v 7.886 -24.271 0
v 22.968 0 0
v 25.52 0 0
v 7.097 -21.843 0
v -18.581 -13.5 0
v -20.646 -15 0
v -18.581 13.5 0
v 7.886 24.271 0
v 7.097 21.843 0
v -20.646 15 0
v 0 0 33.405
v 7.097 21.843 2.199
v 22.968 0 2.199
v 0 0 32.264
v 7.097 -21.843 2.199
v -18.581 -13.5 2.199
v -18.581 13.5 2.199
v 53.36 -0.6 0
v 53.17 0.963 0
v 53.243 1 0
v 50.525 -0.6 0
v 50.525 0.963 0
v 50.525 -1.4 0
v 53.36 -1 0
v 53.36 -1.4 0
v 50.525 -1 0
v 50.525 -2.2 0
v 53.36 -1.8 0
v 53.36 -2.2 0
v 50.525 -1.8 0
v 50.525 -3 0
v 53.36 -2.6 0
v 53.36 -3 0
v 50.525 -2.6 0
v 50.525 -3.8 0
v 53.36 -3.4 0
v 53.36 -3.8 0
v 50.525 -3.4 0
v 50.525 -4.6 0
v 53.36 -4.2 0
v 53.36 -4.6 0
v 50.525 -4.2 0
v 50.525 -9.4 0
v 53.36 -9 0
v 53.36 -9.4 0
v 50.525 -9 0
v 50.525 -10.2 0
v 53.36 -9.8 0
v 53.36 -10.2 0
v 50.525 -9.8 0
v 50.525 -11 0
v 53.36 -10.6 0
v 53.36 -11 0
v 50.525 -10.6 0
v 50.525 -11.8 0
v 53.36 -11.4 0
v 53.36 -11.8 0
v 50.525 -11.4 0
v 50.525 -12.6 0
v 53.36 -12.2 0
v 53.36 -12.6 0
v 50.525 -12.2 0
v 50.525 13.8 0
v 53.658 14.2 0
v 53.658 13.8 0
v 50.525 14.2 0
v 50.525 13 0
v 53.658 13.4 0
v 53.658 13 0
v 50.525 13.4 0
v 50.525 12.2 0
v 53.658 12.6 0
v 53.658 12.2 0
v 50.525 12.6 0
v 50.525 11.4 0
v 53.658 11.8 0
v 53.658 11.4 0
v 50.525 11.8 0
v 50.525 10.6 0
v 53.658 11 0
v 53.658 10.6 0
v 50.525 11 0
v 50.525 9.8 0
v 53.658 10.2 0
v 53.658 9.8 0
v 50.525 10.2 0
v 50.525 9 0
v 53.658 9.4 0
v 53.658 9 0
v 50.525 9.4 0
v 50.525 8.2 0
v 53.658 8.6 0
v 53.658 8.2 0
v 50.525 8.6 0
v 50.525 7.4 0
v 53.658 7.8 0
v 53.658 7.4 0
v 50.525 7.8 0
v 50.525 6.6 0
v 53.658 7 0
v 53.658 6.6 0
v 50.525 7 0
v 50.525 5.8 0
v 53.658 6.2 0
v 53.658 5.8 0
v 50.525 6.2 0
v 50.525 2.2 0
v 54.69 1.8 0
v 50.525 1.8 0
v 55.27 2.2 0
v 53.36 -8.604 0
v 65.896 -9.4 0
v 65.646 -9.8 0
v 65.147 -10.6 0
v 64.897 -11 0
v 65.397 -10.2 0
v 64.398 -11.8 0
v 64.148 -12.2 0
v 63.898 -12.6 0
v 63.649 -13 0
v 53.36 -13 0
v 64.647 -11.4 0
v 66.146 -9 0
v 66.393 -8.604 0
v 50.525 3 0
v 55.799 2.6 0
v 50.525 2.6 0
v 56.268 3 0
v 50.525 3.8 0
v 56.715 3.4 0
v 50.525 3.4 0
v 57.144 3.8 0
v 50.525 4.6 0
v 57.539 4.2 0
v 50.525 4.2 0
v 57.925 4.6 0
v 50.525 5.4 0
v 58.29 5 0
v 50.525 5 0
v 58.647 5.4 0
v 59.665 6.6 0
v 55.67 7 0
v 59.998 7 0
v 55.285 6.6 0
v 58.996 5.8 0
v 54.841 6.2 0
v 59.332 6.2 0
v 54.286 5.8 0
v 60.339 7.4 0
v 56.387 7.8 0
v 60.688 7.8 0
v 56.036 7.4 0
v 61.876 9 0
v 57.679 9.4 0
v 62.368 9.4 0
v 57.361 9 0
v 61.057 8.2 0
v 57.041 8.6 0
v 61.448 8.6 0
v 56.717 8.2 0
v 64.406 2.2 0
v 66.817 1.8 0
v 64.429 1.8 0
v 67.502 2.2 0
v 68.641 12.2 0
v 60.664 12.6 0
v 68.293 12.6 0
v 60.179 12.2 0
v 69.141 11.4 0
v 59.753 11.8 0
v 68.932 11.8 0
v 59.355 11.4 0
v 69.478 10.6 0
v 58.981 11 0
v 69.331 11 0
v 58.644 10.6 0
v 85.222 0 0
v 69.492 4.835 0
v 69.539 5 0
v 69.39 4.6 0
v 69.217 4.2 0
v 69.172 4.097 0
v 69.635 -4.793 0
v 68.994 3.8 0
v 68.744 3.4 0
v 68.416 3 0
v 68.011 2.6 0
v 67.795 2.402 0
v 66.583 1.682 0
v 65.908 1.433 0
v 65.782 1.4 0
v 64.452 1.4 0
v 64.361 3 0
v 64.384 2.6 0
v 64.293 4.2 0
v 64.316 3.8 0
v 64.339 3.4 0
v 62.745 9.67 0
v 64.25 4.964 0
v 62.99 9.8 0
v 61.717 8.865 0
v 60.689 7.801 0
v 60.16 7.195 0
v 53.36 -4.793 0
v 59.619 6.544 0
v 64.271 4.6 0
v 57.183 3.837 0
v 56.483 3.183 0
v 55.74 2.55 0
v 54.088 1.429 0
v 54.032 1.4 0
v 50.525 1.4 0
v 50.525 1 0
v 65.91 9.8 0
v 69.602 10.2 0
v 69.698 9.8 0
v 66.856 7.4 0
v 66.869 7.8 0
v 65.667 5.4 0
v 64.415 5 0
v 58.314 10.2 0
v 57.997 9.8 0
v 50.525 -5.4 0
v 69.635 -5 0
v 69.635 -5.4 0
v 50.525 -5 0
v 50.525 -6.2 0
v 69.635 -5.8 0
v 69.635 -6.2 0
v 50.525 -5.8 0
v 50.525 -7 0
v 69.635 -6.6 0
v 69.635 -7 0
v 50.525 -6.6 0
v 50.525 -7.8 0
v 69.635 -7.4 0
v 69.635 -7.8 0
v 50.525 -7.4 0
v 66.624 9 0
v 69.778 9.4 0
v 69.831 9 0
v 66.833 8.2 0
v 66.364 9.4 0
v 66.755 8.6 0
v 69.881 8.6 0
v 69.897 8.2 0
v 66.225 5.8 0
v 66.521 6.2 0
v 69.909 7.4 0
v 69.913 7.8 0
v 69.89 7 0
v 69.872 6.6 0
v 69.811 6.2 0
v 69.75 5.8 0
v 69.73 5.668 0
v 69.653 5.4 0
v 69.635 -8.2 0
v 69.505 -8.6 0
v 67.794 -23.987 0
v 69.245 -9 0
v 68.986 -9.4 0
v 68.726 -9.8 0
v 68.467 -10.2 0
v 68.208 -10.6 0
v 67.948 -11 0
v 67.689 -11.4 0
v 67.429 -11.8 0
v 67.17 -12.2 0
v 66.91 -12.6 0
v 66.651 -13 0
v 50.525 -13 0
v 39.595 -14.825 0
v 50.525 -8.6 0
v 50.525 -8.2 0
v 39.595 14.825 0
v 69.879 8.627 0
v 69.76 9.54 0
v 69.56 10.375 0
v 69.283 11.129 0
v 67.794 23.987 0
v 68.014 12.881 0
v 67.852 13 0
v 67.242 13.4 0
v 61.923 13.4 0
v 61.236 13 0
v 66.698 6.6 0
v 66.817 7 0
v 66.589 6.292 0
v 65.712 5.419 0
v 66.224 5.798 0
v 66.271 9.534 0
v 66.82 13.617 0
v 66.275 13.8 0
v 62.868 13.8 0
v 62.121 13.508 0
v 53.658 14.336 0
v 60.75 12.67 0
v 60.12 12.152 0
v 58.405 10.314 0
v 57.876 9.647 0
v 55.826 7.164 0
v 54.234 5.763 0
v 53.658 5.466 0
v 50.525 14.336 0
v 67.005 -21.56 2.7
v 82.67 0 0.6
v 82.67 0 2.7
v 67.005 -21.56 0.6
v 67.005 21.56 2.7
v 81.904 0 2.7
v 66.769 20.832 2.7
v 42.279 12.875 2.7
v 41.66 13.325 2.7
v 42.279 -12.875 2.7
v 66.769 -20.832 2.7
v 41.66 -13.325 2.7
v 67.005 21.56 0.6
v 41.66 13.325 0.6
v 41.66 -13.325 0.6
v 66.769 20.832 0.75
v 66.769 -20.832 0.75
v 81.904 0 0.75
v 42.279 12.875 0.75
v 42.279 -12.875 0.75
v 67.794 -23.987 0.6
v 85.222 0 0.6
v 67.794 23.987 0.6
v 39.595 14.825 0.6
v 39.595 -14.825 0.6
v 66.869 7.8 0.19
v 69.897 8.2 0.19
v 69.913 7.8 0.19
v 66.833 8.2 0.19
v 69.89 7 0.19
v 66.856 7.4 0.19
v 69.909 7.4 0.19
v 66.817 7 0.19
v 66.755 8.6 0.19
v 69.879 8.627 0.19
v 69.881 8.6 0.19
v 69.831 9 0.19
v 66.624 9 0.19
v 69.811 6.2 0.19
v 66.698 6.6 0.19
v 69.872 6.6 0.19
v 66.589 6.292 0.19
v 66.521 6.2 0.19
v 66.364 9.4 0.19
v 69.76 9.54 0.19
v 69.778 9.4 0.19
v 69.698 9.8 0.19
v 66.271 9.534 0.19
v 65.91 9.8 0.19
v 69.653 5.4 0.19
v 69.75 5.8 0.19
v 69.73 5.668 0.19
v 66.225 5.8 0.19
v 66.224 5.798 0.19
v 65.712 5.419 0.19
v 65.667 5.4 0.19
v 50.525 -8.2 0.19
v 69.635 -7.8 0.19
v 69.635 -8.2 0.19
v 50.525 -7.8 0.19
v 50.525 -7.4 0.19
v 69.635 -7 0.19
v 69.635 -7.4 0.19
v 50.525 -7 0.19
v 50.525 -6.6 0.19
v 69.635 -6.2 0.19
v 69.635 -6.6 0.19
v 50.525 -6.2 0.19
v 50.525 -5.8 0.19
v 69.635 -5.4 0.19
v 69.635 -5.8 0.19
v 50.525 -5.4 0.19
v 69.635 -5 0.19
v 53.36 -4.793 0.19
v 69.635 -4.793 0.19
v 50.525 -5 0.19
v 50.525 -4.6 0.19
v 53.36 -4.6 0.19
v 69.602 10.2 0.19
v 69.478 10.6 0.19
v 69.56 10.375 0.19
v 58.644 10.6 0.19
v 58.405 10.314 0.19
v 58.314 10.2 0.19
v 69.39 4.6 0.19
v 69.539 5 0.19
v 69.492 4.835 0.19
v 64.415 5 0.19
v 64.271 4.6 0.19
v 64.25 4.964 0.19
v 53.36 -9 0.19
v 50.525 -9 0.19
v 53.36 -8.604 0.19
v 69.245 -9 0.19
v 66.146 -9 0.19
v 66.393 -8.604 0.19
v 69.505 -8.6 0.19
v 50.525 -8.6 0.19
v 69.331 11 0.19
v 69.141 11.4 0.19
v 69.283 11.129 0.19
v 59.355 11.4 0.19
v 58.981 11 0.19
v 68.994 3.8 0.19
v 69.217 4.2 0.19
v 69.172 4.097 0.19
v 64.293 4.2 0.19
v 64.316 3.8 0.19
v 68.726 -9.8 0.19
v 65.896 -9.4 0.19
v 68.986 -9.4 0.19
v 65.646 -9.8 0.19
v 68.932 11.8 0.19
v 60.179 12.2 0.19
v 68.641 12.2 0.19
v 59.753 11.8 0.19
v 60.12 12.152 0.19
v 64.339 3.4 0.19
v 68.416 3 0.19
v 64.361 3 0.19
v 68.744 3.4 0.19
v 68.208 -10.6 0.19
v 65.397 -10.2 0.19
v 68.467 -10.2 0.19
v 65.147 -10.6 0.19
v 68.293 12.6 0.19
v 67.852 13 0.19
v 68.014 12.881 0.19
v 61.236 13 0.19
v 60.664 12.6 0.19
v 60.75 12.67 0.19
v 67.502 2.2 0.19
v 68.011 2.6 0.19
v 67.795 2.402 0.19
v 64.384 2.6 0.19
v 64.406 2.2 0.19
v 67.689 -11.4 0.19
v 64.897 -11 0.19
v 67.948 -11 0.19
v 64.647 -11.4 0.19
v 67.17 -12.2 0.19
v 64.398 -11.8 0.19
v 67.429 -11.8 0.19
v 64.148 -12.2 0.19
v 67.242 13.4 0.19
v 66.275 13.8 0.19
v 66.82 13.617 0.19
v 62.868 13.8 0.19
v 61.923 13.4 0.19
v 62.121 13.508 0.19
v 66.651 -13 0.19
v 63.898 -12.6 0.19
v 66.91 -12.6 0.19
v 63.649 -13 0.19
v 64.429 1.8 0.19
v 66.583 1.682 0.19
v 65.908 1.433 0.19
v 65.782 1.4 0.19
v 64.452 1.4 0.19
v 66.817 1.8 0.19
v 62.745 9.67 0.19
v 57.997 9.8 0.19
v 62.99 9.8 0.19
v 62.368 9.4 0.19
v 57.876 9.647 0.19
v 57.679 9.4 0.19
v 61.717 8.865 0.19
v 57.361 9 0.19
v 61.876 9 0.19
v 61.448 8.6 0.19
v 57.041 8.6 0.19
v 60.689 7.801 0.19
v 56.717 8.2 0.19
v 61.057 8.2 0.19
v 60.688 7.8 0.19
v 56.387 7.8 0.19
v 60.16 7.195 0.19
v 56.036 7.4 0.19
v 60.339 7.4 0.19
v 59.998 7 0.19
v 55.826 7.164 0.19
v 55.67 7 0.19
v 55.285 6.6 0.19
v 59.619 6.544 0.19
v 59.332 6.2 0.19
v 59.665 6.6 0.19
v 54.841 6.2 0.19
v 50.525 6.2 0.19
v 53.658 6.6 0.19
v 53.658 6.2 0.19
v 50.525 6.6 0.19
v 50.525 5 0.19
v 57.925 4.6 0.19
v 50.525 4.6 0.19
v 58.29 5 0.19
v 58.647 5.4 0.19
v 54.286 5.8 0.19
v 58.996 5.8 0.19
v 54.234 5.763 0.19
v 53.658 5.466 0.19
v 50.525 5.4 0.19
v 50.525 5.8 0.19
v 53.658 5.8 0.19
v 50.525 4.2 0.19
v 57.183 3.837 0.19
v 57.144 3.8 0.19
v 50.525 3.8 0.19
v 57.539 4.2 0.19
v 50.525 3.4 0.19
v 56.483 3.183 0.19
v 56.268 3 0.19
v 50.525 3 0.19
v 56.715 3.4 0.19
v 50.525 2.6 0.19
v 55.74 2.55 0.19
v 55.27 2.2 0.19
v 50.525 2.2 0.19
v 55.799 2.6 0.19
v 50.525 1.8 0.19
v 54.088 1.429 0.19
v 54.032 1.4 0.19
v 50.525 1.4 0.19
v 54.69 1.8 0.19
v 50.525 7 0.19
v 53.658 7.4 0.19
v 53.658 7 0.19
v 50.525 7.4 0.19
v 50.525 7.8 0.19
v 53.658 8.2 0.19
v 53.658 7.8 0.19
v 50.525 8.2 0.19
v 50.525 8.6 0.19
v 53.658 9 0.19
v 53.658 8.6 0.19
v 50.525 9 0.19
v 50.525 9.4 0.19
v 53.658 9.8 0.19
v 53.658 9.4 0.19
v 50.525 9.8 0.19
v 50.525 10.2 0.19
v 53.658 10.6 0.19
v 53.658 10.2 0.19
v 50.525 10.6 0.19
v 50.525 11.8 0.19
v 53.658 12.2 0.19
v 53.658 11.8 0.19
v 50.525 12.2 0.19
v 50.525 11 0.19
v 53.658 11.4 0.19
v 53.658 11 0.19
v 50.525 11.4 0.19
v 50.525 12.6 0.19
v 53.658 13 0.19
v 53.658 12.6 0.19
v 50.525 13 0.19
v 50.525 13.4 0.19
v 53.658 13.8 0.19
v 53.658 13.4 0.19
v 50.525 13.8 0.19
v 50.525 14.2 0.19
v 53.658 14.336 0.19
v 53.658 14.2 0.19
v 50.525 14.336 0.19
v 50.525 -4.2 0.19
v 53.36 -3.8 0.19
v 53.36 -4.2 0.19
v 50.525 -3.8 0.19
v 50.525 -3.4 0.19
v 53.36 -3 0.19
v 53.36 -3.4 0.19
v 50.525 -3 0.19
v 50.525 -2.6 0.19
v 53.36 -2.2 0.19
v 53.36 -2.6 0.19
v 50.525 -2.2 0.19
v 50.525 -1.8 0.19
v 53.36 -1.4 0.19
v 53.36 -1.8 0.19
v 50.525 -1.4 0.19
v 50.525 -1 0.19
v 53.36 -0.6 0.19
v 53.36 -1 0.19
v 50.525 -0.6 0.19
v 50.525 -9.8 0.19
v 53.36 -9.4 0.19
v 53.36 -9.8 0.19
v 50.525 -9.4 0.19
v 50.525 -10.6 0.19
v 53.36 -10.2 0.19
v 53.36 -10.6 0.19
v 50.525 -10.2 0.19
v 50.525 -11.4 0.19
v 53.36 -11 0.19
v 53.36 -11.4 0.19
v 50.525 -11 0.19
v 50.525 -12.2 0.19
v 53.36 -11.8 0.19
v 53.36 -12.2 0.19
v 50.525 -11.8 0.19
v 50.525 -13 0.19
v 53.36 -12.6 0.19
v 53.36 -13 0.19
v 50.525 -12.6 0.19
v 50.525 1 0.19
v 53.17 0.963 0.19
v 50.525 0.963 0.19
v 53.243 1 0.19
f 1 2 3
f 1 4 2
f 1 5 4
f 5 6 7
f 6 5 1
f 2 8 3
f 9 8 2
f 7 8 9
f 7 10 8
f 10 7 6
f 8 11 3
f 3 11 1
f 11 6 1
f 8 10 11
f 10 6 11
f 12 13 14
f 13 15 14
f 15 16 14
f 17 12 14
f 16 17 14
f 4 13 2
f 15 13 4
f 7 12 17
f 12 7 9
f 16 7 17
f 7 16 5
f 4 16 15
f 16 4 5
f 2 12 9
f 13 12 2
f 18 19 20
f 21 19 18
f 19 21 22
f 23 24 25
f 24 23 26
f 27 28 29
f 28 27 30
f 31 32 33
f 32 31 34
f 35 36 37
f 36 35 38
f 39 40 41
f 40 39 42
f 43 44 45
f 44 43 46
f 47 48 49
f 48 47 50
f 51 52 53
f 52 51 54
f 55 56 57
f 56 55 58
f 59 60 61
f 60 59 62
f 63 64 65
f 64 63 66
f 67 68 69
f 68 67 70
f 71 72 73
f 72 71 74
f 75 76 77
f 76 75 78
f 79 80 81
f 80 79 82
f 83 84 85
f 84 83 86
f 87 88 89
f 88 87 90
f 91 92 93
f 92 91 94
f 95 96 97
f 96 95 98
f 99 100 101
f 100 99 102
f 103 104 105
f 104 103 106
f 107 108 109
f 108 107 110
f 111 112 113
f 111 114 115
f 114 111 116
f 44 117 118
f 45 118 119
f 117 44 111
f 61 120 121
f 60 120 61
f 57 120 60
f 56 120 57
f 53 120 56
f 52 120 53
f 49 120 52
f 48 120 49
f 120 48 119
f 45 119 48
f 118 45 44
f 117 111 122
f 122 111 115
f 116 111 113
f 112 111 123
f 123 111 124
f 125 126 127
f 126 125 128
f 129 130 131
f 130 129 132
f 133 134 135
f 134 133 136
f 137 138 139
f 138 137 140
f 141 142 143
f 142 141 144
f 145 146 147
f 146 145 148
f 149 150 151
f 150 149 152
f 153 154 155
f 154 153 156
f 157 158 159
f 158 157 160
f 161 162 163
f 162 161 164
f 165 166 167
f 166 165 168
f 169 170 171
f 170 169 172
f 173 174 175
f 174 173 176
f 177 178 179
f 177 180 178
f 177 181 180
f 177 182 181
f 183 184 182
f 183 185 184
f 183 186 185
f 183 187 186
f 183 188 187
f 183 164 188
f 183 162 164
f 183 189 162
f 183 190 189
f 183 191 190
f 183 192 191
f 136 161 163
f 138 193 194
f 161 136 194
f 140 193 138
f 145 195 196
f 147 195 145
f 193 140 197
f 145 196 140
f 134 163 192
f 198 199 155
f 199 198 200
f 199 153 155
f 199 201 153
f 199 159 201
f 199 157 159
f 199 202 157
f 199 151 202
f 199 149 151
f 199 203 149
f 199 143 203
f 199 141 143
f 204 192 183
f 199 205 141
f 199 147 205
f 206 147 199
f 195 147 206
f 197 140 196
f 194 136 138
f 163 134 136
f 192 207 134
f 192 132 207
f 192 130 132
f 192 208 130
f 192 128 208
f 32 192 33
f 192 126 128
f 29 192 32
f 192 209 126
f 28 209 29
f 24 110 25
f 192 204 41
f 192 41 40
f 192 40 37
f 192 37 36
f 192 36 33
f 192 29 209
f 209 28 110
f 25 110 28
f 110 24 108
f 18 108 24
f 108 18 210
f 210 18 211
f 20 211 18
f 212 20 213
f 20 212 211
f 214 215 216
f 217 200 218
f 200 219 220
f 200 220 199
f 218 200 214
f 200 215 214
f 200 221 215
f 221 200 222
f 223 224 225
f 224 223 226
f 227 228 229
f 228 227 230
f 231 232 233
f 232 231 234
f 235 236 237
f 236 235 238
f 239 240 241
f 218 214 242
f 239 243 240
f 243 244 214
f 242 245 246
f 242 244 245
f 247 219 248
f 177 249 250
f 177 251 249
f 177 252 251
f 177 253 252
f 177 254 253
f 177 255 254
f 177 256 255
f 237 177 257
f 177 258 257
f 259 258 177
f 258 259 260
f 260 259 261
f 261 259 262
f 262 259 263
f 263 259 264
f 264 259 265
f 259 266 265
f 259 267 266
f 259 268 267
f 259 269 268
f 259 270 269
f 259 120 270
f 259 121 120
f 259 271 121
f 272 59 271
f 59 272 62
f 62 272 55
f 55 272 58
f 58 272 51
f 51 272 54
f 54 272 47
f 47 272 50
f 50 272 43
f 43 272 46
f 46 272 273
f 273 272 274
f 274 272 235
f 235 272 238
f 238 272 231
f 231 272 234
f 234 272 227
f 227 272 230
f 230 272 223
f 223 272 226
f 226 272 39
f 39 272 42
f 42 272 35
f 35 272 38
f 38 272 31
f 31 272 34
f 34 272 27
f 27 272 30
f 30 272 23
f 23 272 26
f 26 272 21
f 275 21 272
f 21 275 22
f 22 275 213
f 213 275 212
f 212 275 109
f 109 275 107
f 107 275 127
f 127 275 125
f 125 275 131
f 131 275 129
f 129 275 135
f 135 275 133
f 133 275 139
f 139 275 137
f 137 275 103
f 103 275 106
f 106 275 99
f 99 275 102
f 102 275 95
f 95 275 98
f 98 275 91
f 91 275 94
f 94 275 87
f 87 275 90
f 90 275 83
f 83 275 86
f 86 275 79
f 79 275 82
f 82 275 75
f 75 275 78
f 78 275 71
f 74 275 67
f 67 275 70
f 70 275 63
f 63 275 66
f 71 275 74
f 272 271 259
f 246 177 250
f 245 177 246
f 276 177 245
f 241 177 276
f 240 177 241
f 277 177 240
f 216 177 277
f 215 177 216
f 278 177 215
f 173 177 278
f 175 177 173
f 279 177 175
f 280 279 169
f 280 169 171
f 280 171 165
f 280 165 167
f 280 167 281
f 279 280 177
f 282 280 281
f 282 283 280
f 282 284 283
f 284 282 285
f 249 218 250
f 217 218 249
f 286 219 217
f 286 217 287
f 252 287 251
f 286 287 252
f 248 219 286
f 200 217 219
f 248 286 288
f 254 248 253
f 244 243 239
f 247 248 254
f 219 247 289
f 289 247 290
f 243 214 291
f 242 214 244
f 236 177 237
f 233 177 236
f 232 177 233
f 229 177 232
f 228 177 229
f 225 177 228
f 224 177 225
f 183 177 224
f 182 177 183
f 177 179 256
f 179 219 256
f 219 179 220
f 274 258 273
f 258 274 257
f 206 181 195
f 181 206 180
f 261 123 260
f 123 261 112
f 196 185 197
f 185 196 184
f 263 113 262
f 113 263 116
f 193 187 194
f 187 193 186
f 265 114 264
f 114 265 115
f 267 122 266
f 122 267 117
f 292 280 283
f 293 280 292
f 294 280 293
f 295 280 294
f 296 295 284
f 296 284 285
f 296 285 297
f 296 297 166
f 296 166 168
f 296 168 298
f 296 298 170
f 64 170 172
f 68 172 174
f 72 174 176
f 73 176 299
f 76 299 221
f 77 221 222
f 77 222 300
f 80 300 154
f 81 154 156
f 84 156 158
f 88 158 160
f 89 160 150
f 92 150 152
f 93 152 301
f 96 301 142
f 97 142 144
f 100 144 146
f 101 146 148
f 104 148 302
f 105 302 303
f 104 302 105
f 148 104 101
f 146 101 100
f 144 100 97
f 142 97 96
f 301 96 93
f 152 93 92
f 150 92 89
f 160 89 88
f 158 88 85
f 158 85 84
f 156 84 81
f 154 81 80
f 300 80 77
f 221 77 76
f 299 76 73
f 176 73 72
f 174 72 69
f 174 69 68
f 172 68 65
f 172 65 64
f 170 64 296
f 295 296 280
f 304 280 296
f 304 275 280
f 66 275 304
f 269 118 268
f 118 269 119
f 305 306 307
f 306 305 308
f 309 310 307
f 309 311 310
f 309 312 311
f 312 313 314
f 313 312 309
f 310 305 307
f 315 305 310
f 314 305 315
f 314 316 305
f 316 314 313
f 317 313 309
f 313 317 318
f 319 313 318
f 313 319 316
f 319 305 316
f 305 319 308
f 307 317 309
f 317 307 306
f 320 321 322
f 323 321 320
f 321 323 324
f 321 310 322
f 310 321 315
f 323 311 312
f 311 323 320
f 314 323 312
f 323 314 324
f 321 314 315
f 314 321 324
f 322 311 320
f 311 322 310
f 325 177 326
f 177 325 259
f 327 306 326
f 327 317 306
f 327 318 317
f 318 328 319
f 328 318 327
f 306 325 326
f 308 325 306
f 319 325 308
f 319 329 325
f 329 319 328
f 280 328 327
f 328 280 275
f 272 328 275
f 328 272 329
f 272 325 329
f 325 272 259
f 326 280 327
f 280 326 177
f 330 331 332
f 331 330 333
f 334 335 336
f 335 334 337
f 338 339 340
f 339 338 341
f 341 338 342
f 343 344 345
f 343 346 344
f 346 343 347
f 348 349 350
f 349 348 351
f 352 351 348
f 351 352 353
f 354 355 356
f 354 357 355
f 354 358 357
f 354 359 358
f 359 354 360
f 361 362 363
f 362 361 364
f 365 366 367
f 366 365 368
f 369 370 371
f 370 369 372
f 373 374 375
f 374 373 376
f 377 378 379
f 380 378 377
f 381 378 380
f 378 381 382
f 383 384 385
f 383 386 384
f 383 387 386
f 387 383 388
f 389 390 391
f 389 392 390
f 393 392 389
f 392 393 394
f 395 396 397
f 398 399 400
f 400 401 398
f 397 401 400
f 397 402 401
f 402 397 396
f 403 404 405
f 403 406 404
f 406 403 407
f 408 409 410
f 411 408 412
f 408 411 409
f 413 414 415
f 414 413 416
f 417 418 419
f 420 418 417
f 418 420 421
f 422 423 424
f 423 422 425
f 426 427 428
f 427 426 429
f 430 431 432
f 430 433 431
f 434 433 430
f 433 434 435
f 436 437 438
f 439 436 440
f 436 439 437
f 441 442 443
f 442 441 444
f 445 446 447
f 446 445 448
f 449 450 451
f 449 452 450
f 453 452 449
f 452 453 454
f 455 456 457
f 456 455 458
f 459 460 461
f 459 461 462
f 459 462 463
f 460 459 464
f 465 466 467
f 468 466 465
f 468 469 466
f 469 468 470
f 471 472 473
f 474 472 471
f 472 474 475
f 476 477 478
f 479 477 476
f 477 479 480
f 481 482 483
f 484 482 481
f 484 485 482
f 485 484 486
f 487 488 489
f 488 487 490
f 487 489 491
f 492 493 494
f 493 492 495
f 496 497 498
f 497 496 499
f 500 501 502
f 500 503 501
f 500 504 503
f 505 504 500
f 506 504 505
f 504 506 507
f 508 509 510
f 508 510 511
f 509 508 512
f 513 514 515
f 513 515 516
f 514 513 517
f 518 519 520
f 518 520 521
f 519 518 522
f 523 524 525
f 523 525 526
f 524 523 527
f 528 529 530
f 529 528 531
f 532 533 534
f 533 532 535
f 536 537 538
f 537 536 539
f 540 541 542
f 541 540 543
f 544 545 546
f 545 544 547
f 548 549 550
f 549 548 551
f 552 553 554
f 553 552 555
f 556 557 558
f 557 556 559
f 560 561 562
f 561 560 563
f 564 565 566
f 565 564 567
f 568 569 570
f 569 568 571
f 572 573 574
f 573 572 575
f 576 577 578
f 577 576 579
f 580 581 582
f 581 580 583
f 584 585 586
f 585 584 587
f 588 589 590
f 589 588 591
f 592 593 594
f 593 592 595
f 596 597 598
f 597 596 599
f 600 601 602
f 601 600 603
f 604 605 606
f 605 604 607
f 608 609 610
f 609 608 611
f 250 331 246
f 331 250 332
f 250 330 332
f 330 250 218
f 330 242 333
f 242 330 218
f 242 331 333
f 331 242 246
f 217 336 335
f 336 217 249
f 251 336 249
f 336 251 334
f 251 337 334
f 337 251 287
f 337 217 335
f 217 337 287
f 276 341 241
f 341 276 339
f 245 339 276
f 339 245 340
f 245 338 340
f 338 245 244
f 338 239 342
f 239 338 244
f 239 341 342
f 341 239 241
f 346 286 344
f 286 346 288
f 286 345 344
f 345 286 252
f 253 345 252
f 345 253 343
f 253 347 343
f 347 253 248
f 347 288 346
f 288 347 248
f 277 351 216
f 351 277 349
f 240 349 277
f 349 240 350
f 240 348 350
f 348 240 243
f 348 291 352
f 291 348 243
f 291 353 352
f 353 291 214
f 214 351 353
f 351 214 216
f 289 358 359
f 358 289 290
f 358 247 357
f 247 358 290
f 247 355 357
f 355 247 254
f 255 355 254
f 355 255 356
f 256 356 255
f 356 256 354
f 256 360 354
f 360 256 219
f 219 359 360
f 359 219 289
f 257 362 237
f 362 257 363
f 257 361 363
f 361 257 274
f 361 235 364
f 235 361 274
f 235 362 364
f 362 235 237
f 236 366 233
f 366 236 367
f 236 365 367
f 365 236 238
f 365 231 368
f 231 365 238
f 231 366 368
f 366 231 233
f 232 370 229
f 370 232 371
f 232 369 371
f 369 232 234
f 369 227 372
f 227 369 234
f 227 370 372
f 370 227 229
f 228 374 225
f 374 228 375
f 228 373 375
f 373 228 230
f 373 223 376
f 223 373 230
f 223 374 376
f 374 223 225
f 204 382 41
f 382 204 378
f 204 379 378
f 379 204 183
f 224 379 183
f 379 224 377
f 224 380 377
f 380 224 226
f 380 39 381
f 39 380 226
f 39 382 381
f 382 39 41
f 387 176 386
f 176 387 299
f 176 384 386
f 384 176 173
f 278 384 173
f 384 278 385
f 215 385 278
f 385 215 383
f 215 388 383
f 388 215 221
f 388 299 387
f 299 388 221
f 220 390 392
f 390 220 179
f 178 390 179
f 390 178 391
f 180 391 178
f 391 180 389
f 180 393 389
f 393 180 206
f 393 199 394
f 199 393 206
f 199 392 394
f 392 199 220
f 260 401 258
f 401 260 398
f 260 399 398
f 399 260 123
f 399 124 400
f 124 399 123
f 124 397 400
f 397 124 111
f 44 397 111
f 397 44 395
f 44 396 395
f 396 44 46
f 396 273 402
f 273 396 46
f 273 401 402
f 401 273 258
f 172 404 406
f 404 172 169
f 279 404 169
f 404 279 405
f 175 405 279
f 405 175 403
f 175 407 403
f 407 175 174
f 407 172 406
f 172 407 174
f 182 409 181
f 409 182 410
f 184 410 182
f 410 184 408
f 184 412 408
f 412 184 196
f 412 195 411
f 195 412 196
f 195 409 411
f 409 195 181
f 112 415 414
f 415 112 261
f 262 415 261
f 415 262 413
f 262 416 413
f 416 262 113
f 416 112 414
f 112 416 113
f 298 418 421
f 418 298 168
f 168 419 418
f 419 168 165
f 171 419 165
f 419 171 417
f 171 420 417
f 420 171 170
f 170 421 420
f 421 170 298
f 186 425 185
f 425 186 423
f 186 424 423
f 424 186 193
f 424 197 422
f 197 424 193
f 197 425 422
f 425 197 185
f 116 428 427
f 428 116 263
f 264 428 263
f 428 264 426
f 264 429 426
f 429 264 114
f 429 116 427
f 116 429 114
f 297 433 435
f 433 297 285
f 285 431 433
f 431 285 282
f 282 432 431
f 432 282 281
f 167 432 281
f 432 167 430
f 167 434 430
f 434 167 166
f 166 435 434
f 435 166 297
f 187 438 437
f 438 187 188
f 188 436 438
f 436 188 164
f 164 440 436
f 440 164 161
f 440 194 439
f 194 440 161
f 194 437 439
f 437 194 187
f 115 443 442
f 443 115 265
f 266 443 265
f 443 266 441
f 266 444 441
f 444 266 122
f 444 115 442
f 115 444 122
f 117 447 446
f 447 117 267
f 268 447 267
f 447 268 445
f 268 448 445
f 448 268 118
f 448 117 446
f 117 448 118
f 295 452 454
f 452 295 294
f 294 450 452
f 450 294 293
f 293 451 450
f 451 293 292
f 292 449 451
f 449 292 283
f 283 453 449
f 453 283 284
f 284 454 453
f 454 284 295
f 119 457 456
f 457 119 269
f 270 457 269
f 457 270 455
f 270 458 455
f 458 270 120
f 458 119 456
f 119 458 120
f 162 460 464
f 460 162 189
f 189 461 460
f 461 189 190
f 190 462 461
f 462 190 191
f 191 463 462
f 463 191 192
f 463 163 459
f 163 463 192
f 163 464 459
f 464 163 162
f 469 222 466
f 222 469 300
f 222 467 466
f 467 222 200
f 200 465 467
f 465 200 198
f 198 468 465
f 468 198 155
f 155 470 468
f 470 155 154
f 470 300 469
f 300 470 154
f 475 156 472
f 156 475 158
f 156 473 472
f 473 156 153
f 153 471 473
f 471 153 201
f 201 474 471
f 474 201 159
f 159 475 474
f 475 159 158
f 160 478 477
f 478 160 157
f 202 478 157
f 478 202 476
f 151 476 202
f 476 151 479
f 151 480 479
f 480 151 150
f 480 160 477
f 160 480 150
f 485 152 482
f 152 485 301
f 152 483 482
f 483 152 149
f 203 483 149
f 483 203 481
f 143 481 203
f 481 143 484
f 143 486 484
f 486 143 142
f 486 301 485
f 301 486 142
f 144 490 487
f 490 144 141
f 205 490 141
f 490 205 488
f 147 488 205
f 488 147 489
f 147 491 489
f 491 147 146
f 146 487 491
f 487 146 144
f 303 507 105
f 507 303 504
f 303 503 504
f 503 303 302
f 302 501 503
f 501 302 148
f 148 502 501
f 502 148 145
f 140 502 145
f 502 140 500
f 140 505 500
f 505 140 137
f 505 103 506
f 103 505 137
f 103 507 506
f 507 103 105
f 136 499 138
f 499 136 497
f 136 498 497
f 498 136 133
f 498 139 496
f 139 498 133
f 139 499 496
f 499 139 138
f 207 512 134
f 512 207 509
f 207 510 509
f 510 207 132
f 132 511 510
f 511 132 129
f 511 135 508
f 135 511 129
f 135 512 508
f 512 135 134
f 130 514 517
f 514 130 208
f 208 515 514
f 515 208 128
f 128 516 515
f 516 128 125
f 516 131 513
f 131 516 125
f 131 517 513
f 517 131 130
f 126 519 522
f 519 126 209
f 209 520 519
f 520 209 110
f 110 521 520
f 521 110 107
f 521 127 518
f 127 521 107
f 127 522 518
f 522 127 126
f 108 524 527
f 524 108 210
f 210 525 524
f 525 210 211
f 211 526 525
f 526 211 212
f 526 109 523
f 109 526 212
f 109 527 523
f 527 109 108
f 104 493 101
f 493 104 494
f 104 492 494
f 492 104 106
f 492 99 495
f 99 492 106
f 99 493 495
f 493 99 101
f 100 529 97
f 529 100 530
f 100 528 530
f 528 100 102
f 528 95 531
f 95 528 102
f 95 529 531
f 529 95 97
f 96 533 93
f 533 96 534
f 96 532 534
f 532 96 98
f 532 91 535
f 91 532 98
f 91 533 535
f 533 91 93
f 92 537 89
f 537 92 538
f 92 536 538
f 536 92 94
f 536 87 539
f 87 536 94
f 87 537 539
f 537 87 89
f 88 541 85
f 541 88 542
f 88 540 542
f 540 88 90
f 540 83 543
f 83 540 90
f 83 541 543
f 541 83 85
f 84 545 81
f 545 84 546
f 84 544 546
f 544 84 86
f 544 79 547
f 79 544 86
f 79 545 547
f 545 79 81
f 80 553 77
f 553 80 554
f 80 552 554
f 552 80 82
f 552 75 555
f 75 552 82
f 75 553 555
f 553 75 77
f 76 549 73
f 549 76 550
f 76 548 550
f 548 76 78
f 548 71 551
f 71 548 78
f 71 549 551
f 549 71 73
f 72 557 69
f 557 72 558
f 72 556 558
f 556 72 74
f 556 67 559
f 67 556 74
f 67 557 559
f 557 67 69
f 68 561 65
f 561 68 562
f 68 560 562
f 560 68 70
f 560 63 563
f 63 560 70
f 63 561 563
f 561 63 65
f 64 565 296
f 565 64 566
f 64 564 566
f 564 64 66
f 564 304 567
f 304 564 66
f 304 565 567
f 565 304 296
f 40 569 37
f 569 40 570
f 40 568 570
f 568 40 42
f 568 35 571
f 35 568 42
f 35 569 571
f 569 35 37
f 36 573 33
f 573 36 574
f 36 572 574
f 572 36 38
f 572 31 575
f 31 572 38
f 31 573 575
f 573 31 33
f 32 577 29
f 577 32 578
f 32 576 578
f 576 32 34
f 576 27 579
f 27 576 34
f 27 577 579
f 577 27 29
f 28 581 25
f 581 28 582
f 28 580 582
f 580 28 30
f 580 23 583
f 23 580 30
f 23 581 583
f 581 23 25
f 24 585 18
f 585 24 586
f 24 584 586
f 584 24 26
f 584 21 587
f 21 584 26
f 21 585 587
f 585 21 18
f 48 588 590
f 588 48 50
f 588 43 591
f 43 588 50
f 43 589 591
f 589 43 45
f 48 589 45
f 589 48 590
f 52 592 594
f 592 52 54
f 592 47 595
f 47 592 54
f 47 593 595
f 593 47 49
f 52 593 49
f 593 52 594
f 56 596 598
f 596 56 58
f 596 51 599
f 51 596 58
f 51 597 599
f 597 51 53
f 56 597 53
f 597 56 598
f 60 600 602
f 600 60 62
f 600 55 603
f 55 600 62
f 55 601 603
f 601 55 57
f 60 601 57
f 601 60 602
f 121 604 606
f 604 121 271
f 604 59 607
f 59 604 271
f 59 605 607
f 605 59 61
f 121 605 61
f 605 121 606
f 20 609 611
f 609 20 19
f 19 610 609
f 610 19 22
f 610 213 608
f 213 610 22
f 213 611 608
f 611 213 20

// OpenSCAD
// dodekaeder.scad
//   experiments with pentagons forming a dodecahedron
//
//
// Background:
//   - kann auch als Adventskalender benutzt werden.
//   - printed with a layer step of 0.15 mm
//   - CAD manual: http://www.openscad.org/documentation.html
//   - https://de.wikipedia.org/wiki/Dodekaeder
//   - https://en.wikipedia.org/wiki/Dodecahedron
//   - hosted on:
//     https://www.thingiverse.com/thing:4012530
//     git@github.com:Github6am/am_parts3D.git
//
// Andreas Merz 2019-12-01, v1.2 
// GPLv3 or later, see http://www.gnu.org/licenses

a=30;     // outer edge length
b=27;     // inner edge length
w=0.6;    // wall thickness

// Dodekaederzahlen
ci=1.113516364411607;    // Inkugelradius/a  sqrt((25+11*sqrt(5))/10)/2;
co=1.401258538444073;    // Umkugelradius/a  sqrt(3)*(1+sqrt(5))/4;
h=a*ci;                  // height of a cone           

beta=121.7174744114610;  // deg, Flaechen-Kantenwinkel
alpha=116.5650511770780; // deg, Flaechenwinkel , acos(-1/sqrt(5))


module poly2D(r=30, n=5) {
   circle(r=r, $fn=n);
}

module pentagon2D(l_edge = a) {
  poly2D(r = l_edge/(2*sin(36)), n=5);
}

//-----------------------------------------------
// pyramid shaped parts of a dodecahedron
//-----------------------------------------------

module facet0() {
  d=a/(2*tan(36));   // Abstand Seitenmitte vom Zentrum
  phi1=atan(d/h);    // Winkel zwischen Seitenflaeche und Lot
  dh=w/sin(phi1);    // vertikale Verschiebung, um Wandstaerke zu erreichen
  
  difference() {
    linear_extrude(height=h, scale=0) pentagon2D();
    translate([0, 0, -dh]) 
      linear_extrude(height=h, scale=0) pentagon2D();
  }
}

module facet1() {
  u=ci*(a-b);
  union() {
    facet0();
    difference() {
      linear_extrude(height=u, scale=(h-u)/h) pentagon2D(l_edge=a-w);
      translate([0, 0, -0.1])
        linear_extrude(height=u+0.2, scale=1) pentagon2D(l_edge=b);
    }
  }
}

module facet1t() {
  phi2=2*beta-180;   
  translate([0, 0, h]) rotate([0, phi2, 0]) translate([0, 0, -h]) rotate([0, 0, 36]) facet1(); 
}

module facet6() {
  union() {
    facet1();
    rotate([0, 0, 0*72]) facet1t();
    rotate([0, 0, 1*72]) facet1t();
    rotate([0, 0, 2*72]) facet1t();
    rotate([0, 0, 3*72]) facet1t();
    rotate([0, 0, 4*72]) facet1t();
  }
}

module facet12() {
  union() {
    facet6();
    translate([0, 0, h]) rotate([0, 180, 72]) translate([0, 0, -h]) facet6();
  }
}

//-----------------------------------------------
// numbered caps to close the faces
//-----------------------------------------------

module cap1() {
  c=0.35;
  hrim=0.7*(a-b);
  union() {
    linear_extrude(height=w, scale=1) pentagon2D(l_edge=a-c);
    difference() {    // rim
      linear_extrude(height=w+hrim, scale=1) pentagon2D(l_edge=b-c);
      translate([0, 0, w+0.15])
  	linear_extrude(height=w+hrim, scale=1) pentagon2D(l_edge=b-c-1.5*w);
    }
  }
}

module grid2D(spacing=0.8) {    // a grid pattern for the text
  w=0.5;
  for( i=[-a:spacing:a] ) {
    translate([i,0,-0.01]) square([spacing/2,a],center=true);
  }
}

module capA(txt="12") {
  depth=0.2;
  fontname = "Liberation Sans:Bold";
  fontsize = 20;
  difference() {
    cap1();
    //color("red")
    translate([0,0,-0.01]) mirror([1,0,0]) rotate(90)
      linear_extrude(height = depth)
	difference() {
	  text(txt, size = fontsize, font = fontname, halign = "center", valign = "center", $fn = 16);
	  grid2D();
	}
  }
}

//-----------------------------------------------
// a foot to place the dodecahedron segments in
//-----------------------------------------------

nf=5;	   // nf     number of faces, a high number yields a circular shape.
c2=2;	   // c2     height of foot cone below rim
kk=tan(180-beta);
clr=1.2;     // clearance

//h2=a;      // h2     height of foot cone above rim

module foot0(hole=0, h2=1.2*a) {
  //hole    option for depth of conical borehole
  // h2     height of foot cone above rim
  c=clr;
  // helper sizes
  rr = a/(2*sin(36)); // inner rim radius
  h=kk*rr;            // dirty trick: override height with height of imagined sidewall pyramid
  r2 = rr*(h+h2)/h+c;   // inner upper radius
  rc = rr*(h-c2)/h+c;   // inner lower radius
  rh = rr*(h-hole)/h+c; // inner lower hole radius
  phi1=atan(rr/h);      // Winkel zwischen Kante und Lot
  dh=w/sin(phi1);       // vertikale Verschiebung, um Wandstaerke zu erreichen
  H=h+dh;               // outer height of full cone
  Rr=rr+w;              // outer radius
  R2=r2+w;
  Rc=rc+w;
  Rh=rh+w;
  
  translate([0, 0, 0])
    difference() {
      translate([0, 0, 0])            linear_extrude(height=(h2+c2),   scale=R2/Rc) poly2D(r = Rc, n=nf);
      translate([0, 0, c2-hole+0.05]) linear_extrude(height=(h2+hole), scale=r2/rh) poly2D(r = rh, n=nf);
  }
}

module foot1() {
  rim=2;
  c=clr;
  h2=a/4;
  rr = a/(2*sin(36)); // rim radius
  h=kk*rr;
  rc = rr*(h-c2)/h+c;   // lower radius
  r2 = rr*(h+h2)/h+c;   // inner upper radius
  
  
  union() {
  translate([0, 0, h2+c2])
    union() {
      translate([0, 0, 0])
	difference() {
          foot0(hole=0);
          translate([0, 0, -h]) linear_extrude(height=2*h, scale=0) poly2D(r = 1.99*rr, n=nf);
	}
      mirror([0, 0, 1]) foot0(hole=c2+1,h2=h2);
    }
    difference() {
       translate([0, 0, 0])    linear_extrude(height=1)  poly2D(r = r2+rim, n=nf);
       translate([0, 0, -0.1]) linear_extrude(height=1.2, scale=0.99) poly2D(r = r2, n=nf);
    }
  }
}

module foot2() {
  rim=3;
  c=clr;
  h2=1;
  nc=144;
  rs=a*co+c;           // inner sphere radius
  Rs=rs+w;             // outer sphere radius
  rc = 0.7*a;          // inner cylinder radius
  Rc=rc+w;             // outer cylinder radius
  
  translate([0, 0, Rs+h2])
    difference() {
      union() {
	sphere(r=Rs,$fn=196);
	translate([0, 0, -Rs-h2]) cylinder(r=Rc,     h=2*h,$fn=nc);
	translate([0, 0, -Rs-h2]) cylinder(r=Rc+rim, h=2,  $fn=nc);
      }
      union() {
	sphere(r=rs,$fn=196);
	//translate([0, 0, -Rs-h2-0.1]) cylinder(r1=rc, r2=a/2-2,  h=h2+4, $fn=nc);
	translate([0, 0, a/5])      cylinder(r=Rs+1, h=Rs+1,$fn=nc);   // cut off top of sphere
      }
    }
}

//---------------- Instances ---------------------

//translate([0, 0, 0]) facet12();     // das hat bisher beim Ausdrucken Probleme gemacht.

facet1();
//facet6();

translate([2*a, 0, 0]) capA(txt=str(12));

//foot1();
//difference() {
//foot2();
//translate([0, 0, -10]) cube(40, center=false); }

if(false) {
  for( ii=[1:3] ) {
    rotate(ii*120) translate([-0.9*a, 0, 0]) capA(txt=str(ii*2));
  }

  for( ii=[7:9] ) {
    translate([-10, -2.6*a, 0])
    rotate(ii*120+60) translate([-0.9*a, 0, 0]) capA(txt=str(ii*2));
  }


  for( ii=[10:12] ) {
    translate([1.6*a, (ii-11)*1.7*a, 0]) capA(txt=str(ii*2));
  }

}
